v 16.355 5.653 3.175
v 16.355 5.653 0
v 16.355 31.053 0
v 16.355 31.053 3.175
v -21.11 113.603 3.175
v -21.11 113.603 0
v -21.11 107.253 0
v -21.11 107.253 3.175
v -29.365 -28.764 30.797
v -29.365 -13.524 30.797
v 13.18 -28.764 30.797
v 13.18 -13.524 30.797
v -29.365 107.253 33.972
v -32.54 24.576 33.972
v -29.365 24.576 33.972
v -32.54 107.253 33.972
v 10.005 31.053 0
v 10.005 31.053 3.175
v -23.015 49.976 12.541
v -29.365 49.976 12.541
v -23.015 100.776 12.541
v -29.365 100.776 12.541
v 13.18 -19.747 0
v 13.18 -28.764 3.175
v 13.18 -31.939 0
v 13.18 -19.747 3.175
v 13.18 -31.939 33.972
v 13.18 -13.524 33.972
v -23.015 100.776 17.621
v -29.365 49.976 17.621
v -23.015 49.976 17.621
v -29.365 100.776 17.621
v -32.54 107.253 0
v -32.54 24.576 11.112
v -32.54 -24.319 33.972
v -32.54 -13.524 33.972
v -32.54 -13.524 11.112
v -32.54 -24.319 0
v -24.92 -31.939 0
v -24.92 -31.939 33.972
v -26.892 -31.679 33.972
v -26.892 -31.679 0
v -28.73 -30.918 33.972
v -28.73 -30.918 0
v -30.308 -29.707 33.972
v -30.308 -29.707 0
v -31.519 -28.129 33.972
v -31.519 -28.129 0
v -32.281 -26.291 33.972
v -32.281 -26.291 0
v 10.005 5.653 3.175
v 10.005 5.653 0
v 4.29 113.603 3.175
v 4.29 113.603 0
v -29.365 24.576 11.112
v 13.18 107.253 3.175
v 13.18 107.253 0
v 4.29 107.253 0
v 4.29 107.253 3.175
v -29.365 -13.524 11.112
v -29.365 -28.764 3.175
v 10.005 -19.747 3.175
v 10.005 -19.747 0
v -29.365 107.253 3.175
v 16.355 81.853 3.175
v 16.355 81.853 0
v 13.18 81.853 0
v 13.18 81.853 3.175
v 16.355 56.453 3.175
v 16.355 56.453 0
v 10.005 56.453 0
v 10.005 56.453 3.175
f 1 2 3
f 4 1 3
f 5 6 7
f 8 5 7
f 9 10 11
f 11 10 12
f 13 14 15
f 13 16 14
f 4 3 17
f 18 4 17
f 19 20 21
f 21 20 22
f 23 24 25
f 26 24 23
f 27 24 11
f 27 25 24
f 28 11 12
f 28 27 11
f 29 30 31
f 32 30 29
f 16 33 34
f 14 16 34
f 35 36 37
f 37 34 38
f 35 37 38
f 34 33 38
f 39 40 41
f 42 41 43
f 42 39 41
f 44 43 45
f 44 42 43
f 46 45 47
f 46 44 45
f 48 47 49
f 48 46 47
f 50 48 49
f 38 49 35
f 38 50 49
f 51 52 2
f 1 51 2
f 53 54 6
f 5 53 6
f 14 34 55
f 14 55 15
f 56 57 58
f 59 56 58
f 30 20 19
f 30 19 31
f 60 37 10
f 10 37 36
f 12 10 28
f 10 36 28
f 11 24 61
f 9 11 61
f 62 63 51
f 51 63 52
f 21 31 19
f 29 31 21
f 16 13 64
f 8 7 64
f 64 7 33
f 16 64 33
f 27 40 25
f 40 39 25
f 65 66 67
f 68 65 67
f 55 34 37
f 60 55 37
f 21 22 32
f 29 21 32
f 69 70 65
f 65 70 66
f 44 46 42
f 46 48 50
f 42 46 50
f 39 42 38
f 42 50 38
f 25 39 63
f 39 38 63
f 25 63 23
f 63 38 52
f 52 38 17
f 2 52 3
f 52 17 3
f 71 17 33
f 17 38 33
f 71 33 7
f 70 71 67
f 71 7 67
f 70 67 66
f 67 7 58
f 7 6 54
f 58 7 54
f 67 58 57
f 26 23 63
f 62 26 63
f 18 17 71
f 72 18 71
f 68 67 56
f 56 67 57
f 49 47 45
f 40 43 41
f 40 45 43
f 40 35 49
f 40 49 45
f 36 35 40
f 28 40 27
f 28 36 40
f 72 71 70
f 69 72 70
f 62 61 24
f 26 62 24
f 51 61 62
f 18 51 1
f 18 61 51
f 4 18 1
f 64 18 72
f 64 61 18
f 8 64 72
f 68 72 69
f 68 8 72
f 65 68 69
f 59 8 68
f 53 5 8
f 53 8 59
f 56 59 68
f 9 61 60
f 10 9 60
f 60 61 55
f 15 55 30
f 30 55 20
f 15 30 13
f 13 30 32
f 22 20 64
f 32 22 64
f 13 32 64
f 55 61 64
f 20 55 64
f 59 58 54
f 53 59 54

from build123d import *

# Parameters (mm, degrees)
F1_DEPTH = 3.175
F3_DEPTH = 30.7975
F4_W     = 42.545
F4_H     = 15.24
F5_DEPTH = 3.175
F6_W     = 38.1
F6_H     = 22.86
F7_DEPTH = 48.896
F8_W     = 50.8
F8_H     = 5.08
F9_DEPTH = 6.35
F10_R    = 7.62


with BuildPart() as f1:
    # F0 (on Top) → F1 (new body)
    with BuildSketch(Plane.XY):
        Polygon((-21.1101771393, 107.2532582595), (-32.5401771393, 107.2532582595), (-32.5401771393, -31.9387417405), (13.1798228607, -31.9387417405), (13.1798228607, -19.7467417405), (10.0048228607, -19.7467417405), (10.0048228607, 5.6532582595), (13.1798228607, 5.6532582595), (16.3548228607, 5.6532582595), (16.3548228607, 31.0532582595), (13.1798228607, 31.0532582595), (10.0048228607, 31.0532582595), (10.0048228607, 56.4532582595), (13.1798228607, 56.4532582595), (16.3548228607, 56.4532582595), (16.3548228607, 81.8532582595), (13.1798228607, 81.8532582595), (13.1798228607, 107.2532582595), (10.0048228607, 107.2532582595), (4.2898228607, 107.2532582595), (4.2898228607, 113.6032582595), (-21.1101771393, 113.6032582595), align=None)
    extrude(amount=F1_DEPTH)

    # F2 (on face) → F3 (join)
    with BuildSketch(Plane.XY.offset(3.175)):
        Polygon((13.1798228607, -28.7637417405), (-29.3651771393, -28.7637417405), (-29.3651771393, 107.2532582595), (-32.5401771393, 107.2532582595), (-32.5401771393, -31.9387417405), (13.1798228607, -31.9387417405), align=None)
    extrude(amount=F3_DEPTH)

    # F4 (on face) → F5 (join)
    with BuildSketch(Plane.XY.offset(33.9725)):
        with Locations((-8.0926771393, -21.1437417405)):
            Rectangle(F4_W, F4_H)
    extrude(amount=-F5_DEPTH)

    # F6 (on face) → F7 (cut, through all)
    with BuildSketch(Plane(origin=(-32.5401771393, 0, 0), x_dir=(0, -1, 0), z_dir=(-1, 0, 0))):
        with Locations((-5.5262582595, 22.5425)):
            Rectangle(F6_W, F6_H)
    extrude(amount=-F7_DEPTH, mode=Mode.SUBTRACT)

    # F8 (on face) → F9 (join)
    with BuildSketch(Plane.YZ.offset(-29.3651771393)):
        with Locations((75.3762582595, 15.08125)):
            Rectangle(F8_W, F8_H)
    extrude(amount=F9_DEPTH)

    # F10
    f10_edges = [f1.edges().sort_by_distance(p)[0] for p in [
        (-32.540177, -31.938742, 16.98625),
    ]]
    fillet(f10_edges, radius=F10_R)


solid = f1.part
